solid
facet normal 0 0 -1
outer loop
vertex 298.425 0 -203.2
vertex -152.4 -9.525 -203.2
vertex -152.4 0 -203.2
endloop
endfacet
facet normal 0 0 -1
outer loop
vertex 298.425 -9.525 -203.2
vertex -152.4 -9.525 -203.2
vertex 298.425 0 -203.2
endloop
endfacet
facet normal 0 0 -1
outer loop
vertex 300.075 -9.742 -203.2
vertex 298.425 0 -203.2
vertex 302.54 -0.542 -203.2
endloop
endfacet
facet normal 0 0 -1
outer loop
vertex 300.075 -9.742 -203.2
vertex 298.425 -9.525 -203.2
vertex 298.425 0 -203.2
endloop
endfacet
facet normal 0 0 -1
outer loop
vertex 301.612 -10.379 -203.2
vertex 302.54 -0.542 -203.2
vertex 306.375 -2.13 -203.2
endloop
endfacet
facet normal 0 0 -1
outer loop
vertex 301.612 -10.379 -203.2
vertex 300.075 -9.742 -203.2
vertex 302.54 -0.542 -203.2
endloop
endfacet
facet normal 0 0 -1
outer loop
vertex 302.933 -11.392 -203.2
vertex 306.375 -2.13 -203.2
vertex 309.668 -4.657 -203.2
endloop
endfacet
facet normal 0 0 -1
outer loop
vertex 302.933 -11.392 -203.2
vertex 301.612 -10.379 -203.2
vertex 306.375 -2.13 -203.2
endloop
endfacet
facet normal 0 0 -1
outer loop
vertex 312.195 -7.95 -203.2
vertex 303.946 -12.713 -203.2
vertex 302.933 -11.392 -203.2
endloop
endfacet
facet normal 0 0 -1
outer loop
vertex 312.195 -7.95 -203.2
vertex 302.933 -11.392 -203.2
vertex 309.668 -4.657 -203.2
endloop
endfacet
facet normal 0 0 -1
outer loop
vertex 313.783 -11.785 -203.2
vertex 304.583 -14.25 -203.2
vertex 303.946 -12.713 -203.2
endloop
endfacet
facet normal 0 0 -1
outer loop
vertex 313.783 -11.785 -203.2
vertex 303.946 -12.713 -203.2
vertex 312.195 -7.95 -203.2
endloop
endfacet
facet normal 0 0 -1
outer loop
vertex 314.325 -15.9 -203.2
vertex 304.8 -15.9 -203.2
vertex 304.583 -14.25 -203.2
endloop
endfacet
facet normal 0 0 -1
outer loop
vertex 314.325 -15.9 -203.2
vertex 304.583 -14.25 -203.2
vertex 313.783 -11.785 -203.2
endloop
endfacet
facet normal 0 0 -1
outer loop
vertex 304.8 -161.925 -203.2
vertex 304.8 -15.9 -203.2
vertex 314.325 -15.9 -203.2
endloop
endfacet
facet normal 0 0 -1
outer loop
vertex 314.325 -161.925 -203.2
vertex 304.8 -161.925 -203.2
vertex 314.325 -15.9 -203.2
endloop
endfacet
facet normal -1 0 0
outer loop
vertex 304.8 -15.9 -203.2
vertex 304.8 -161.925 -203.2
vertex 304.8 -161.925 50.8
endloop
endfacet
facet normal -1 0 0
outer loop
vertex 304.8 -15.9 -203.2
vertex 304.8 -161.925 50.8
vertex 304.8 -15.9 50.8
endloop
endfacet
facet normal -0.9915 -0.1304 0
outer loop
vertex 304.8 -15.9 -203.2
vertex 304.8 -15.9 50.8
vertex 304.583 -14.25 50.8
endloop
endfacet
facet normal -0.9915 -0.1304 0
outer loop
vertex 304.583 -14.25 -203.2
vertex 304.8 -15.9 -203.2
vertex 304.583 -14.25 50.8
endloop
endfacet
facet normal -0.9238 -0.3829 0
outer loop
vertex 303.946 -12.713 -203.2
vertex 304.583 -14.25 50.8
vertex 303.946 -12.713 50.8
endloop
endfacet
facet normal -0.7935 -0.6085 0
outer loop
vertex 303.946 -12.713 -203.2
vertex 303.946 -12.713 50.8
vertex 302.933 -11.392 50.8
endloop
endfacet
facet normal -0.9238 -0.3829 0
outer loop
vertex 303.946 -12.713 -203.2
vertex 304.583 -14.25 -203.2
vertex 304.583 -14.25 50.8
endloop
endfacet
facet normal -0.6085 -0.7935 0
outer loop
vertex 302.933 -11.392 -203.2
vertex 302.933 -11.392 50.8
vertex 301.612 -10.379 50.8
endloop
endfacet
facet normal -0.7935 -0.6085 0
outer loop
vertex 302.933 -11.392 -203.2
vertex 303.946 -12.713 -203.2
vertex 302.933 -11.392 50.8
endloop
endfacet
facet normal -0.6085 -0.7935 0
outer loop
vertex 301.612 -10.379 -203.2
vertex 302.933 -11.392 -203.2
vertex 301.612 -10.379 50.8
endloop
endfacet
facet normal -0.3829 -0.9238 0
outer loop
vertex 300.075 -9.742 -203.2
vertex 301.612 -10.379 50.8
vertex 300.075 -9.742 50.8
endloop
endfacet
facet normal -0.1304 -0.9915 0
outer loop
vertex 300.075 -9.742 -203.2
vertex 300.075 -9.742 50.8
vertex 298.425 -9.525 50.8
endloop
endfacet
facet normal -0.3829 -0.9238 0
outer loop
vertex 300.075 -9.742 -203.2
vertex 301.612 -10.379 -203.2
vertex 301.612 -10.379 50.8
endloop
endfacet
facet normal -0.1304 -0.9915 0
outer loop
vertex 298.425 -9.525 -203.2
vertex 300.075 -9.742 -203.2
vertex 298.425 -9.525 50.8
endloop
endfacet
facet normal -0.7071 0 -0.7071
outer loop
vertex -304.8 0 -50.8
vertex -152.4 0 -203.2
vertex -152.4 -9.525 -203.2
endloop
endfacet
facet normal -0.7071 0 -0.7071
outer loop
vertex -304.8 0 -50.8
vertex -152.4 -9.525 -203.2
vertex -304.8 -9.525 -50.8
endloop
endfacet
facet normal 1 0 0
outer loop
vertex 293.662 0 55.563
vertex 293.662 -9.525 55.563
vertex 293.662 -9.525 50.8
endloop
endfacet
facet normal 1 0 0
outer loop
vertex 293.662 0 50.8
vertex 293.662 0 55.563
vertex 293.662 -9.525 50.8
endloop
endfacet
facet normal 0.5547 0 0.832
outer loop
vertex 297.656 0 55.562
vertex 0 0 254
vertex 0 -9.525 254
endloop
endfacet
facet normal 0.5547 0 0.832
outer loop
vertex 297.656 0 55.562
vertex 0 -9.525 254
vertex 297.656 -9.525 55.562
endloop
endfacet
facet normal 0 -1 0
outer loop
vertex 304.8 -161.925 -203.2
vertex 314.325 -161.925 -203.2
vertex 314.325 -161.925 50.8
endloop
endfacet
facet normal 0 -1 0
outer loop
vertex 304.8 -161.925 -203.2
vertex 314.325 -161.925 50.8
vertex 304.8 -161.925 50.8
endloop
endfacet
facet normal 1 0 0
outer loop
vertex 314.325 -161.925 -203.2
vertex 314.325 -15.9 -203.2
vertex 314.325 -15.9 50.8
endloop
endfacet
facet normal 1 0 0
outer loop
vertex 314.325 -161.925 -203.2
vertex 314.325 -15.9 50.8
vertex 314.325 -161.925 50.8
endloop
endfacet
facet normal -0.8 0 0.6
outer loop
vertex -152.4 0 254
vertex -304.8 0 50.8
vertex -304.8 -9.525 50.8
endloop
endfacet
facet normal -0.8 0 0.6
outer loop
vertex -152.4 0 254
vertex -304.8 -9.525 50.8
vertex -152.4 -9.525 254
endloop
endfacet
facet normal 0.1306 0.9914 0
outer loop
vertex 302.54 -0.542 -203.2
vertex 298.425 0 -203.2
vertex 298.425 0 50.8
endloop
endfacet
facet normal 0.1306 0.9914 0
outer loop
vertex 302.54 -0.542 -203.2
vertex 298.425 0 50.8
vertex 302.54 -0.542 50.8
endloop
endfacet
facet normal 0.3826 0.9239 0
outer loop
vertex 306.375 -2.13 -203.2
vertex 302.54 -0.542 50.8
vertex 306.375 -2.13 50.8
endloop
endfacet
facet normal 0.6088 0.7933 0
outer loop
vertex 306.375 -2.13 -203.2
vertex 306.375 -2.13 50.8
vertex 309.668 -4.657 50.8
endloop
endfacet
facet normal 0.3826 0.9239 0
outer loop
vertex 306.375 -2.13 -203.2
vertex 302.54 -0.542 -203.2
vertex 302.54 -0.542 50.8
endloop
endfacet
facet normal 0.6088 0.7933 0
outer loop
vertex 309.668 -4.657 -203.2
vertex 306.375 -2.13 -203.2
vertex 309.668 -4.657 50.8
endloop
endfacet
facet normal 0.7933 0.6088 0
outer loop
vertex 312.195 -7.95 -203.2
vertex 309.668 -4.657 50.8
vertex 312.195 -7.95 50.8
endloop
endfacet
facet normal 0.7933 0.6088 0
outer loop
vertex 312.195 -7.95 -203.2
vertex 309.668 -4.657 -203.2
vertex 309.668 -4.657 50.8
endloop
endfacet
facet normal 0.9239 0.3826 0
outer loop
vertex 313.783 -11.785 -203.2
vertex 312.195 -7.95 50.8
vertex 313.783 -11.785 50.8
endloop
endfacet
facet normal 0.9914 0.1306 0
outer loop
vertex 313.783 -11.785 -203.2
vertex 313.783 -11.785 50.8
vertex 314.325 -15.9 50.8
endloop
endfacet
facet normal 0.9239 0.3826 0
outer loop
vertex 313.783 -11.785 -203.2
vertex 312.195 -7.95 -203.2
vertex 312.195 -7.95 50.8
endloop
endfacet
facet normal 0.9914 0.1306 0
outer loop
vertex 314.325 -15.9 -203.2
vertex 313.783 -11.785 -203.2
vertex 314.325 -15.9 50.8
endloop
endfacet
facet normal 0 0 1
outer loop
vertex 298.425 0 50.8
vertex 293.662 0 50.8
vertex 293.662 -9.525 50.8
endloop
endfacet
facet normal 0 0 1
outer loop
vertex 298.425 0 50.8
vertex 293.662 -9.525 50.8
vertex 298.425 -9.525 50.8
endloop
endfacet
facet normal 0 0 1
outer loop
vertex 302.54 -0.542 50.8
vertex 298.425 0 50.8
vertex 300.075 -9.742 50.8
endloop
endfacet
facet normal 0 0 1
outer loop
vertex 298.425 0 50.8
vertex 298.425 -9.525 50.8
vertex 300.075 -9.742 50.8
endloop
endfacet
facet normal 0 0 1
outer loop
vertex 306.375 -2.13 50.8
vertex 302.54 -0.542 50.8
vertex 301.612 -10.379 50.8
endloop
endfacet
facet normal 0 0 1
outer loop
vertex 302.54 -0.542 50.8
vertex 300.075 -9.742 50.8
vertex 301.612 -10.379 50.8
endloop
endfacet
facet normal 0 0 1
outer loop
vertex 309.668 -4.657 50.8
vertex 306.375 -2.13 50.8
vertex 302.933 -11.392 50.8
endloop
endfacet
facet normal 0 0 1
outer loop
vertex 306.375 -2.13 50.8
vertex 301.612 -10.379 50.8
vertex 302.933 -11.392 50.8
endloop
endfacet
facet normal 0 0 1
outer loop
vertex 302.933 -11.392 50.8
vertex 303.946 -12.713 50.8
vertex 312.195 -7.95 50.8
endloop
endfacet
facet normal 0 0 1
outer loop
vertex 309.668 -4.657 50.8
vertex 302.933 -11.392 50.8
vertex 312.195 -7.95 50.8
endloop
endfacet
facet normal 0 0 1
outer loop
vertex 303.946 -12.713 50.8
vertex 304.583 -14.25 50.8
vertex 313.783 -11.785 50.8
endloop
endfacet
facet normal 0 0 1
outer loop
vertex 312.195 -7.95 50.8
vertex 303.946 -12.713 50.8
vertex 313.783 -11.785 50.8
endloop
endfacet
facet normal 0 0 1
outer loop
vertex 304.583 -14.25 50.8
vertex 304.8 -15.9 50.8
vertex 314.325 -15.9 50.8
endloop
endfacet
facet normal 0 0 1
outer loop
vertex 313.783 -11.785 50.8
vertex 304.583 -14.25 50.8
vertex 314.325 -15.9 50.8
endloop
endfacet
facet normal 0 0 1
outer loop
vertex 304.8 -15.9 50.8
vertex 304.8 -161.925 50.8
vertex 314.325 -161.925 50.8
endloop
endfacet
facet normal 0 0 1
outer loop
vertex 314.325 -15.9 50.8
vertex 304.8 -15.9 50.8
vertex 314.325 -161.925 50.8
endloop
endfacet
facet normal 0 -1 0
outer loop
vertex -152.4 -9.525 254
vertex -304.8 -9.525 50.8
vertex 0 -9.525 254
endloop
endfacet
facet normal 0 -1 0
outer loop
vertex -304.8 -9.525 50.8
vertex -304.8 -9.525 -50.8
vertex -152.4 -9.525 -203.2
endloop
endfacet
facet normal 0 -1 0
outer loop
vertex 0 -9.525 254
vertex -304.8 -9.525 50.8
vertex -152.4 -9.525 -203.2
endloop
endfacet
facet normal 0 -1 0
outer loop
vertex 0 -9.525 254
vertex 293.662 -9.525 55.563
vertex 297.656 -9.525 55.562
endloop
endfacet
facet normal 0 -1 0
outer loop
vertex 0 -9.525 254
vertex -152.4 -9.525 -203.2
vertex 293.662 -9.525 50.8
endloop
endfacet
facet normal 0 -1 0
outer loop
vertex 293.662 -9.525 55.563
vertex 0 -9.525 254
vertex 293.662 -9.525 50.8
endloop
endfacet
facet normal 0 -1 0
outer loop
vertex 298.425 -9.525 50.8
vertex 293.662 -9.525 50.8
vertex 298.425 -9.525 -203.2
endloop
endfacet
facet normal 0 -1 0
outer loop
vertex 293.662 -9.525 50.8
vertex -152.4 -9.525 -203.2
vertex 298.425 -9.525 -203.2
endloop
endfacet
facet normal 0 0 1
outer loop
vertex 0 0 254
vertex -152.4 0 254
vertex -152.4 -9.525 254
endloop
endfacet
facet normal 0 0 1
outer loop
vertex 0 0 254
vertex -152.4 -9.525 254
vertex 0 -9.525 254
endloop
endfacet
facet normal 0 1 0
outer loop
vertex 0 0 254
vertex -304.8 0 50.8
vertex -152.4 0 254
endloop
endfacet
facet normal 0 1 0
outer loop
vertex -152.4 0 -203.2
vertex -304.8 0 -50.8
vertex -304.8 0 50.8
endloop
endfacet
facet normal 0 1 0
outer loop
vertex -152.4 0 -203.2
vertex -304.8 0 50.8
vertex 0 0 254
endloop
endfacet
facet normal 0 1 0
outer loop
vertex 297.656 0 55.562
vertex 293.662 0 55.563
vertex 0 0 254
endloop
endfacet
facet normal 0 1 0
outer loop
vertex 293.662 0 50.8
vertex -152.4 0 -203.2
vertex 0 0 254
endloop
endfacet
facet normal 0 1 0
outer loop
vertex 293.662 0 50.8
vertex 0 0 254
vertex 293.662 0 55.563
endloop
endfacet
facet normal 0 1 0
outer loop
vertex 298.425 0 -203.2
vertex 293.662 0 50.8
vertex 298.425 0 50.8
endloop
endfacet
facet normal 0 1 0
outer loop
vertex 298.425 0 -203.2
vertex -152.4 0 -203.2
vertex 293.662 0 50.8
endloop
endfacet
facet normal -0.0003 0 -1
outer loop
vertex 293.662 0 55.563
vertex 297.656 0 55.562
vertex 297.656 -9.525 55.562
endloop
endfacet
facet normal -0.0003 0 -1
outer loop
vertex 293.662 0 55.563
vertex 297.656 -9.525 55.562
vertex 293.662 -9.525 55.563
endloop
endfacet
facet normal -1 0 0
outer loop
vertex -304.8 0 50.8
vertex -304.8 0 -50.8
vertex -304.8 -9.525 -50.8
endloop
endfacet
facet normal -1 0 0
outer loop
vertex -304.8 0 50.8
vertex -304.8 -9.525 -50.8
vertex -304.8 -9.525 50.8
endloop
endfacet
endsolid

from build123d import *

# Parameters (mm, degrees)
BASE_FLANGE1_DEPTH            = 9.525
EDGE_FLANGE1_STRIP_W          = 50.8508
EDGE_FLANGE1_STRIP_H          = 9.525
EDGE_FLANGE1_STRIP_CUT_DEPTH  = 254
EDGE_FLANGE1_RELIEF_W         = 55.6133
EDGE_FLANGE1_RELIEF_H         = 4.7625
EDGE_FLANGE1_RELIEF_CUT_DEPTH = 9.525
EDGE_FLANGE1_DEPTH            = 254


# Sheet-metal steps are written as plain solids
with BuildPart() as part:
    # Sketch1 → Base-Flange1 (new body)
    with BuildSketch(Plane(origin=(0, 0, 0), x_dir=(1, 0, 0), z_dir=(0, 1, 0))):
        Polygon((304.8, 50.8), (304.8, 203.2), (-152.4, 203.2), (-304.8, 50.8), (-304.8, -50.8), (-152.4, -254), (0, -254), (304.8, -50.8), align=None)
    extrude(amount=-BASE_FLANGE1_DEPTH)

    # Edge-Flange1 strip (across the edge) → Edge-Flange1 strip cut (cut)
    with BuildSketch(Plane(origin=(304.8, -9.525, -203.2), x_dir=(-1, 0, 0), z_dir=(0, 0, 1))):
        with Locations((-19.05, -4.7625)):
            Rectangle(EDGE_FLANGE1_STRIP_W, EDGE_FLANGE1_STRIP_H)
    extrude(amount=EDGE_FLANGE1_STRIP_CUT_DEPTH, mode=Mode.SUBTRACT)

    # Edge-Flange1 relief (on the sheet) → Edge-Flange1 relief cut (cut)
    with BuildSketch(Plane(origin=(298.4246, -9.525, -203.2), x_dir=(-1, 0, 0), z_dir=(0, -1, 0))):
        with Locations((-23.04415, -256.38125)):
            Rectangle(EDGE_FLANGE1_RELIEF_W, EDGE_FLANGE1_RELIEF_H)
    extrude(amount=-EDGE_FLANGE1_RELIEF_CUT_DEPTH, mode=Mode.SUBTRACT)

    # Edge-Flange1 section (across the edge) → Edge-Flange1 (add)
    with BuildSketch(Plane(origin=(304.8, -9.525, -203.2), x_dir=(-1, 0, 0), z_dir=(0, 0, 1))):
        with BuildLine():
            Line((-9.525, 6.3754), (-9.525, 152.4))
            Line((-9.525, 152.4), (0, 152.4))
            Line((0, 152.4), (0, 6.3754))
            ThreePointArc((0, 6.3754), (1.867311427, 1.867311427), (6.3754, 0))
            Line((6.3754, 0), (6.3754, -9.525))
            ThreePointArc((6.3754, -9.525), (-4.867880664, -4.867880664), (-9.525, 6.3754))
        make_face()
    extrude(amount=EDGE_FLANGE1_DEPTH)


solid = part.part
